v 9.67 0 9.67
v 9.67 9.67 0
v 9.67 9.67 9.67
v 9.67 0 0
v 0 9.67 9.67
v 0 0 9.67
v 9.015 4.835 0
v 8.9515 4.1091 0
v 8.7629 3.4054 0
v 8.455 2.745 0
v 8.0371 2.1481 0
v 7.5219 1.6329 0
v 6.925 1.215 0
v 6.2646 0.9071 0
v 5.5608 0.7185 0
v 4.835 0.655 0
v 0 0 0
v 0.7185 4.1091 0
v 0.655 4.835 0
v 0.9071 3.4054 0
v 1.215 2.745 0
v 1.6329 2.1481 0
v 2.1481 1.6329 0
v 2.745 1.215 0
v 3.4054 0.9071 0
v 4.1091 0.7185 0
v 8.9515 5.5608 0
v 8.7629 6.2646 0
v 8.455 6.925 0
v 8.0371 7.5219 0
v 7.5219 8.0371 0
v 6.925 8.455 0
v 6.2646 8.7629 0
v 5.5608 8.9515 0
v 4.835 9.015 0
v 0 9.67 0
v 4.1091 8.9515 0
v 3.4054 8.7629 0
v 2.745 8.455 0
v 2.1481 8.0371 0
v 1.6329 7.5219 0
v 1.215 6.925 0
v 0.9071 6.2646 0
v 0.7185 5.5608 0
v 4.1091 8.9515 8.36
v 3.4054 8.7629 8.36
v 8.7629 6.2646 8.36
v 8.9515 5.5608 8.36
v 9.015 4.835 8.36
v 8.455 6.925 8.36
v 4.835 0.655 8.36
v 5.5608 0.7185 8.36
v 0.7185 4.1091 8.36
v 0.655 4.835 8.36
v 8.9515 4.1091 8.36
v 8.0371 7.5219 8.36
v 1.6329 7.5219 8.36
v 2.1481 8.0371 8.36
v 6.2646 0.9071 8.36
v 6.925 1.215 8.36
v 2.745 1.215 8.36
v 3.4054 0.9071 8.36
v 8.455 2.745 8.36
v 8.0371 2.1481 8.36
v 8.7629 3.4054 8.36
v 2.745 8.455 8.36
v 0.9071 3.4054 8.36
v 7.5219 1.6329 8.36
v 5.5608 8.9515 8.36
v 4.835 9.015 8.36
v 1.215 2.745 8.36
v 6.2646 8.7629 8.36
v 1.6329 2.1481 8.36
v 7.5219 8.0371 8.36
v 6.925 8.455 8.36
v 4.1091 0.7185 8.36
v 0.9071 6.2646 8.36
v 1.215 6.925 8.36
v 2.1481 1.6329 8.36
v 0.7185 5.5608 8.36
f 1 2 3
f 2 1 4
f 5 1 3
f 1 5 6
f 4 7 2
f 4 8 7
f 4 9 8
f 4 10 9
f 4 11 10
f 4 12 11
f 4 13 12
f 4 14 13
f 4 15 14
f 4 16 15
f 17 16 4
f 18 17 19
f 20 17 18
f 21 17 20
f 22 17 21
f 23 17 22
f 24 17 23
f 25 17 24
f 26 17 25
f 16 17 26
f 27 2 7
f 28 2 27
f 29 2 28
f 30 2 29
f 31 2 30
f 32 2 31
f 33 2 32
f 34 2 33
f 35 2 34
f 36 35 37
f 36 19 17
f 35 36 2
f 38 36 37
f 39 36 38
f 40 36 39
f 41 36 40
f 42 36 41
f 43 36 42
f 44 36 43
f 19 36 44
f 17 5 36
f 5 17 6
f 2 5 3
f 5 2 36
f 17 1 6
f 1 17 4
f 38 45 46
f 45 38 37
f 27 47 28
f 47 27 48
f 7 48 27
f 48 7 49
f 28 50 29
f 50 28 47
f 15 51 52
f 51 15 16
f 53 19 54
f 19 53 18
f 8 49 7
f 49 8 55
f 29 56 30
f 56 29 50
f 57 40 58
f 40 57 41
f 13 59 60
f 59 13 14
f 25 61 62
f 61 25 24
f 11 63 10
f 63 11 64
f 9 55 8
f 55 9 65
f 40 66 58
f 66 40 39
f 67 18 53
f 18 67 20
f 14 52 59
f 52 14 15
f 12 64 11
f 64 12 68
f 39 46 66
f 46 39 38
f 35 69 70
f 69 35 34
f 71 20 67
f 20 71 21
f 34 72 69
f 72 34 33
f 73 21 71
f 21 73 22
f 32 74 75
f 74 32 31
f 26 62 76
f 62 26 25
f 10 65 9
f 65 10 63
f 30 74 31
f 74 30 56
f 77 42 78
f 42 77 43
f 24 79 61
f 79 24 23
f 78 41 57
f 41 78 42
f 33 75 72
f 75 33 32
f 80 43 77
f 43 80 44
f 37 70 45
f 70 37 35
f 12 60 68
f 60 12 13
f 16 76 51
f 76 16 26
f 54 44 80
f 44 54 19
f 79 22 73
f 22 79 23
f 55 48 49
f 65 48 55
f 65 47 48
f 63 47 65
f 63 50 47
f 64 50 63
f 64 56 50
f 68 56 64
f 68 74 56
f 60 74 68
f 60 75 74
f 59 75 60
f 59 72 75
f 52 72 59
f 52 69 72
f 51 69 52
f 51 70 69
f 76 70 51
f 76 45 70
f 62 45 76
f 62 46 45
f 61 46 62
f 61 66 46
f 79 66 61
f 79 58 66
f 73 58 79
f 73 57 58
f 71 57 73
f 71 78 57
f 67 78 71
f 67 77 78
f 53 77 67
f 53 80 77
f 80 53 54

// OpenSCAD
$fn=36;

//Durchmesser Plastik LED
d=8.36;

//3 Linien nach Perimeters.xlsx
c=9.67;



difference()
{
cube(c);


xy = (c-d)/2;

translate([xy+d/2,xy+d/2,0])
cylinder(h=d, d=d);
}
